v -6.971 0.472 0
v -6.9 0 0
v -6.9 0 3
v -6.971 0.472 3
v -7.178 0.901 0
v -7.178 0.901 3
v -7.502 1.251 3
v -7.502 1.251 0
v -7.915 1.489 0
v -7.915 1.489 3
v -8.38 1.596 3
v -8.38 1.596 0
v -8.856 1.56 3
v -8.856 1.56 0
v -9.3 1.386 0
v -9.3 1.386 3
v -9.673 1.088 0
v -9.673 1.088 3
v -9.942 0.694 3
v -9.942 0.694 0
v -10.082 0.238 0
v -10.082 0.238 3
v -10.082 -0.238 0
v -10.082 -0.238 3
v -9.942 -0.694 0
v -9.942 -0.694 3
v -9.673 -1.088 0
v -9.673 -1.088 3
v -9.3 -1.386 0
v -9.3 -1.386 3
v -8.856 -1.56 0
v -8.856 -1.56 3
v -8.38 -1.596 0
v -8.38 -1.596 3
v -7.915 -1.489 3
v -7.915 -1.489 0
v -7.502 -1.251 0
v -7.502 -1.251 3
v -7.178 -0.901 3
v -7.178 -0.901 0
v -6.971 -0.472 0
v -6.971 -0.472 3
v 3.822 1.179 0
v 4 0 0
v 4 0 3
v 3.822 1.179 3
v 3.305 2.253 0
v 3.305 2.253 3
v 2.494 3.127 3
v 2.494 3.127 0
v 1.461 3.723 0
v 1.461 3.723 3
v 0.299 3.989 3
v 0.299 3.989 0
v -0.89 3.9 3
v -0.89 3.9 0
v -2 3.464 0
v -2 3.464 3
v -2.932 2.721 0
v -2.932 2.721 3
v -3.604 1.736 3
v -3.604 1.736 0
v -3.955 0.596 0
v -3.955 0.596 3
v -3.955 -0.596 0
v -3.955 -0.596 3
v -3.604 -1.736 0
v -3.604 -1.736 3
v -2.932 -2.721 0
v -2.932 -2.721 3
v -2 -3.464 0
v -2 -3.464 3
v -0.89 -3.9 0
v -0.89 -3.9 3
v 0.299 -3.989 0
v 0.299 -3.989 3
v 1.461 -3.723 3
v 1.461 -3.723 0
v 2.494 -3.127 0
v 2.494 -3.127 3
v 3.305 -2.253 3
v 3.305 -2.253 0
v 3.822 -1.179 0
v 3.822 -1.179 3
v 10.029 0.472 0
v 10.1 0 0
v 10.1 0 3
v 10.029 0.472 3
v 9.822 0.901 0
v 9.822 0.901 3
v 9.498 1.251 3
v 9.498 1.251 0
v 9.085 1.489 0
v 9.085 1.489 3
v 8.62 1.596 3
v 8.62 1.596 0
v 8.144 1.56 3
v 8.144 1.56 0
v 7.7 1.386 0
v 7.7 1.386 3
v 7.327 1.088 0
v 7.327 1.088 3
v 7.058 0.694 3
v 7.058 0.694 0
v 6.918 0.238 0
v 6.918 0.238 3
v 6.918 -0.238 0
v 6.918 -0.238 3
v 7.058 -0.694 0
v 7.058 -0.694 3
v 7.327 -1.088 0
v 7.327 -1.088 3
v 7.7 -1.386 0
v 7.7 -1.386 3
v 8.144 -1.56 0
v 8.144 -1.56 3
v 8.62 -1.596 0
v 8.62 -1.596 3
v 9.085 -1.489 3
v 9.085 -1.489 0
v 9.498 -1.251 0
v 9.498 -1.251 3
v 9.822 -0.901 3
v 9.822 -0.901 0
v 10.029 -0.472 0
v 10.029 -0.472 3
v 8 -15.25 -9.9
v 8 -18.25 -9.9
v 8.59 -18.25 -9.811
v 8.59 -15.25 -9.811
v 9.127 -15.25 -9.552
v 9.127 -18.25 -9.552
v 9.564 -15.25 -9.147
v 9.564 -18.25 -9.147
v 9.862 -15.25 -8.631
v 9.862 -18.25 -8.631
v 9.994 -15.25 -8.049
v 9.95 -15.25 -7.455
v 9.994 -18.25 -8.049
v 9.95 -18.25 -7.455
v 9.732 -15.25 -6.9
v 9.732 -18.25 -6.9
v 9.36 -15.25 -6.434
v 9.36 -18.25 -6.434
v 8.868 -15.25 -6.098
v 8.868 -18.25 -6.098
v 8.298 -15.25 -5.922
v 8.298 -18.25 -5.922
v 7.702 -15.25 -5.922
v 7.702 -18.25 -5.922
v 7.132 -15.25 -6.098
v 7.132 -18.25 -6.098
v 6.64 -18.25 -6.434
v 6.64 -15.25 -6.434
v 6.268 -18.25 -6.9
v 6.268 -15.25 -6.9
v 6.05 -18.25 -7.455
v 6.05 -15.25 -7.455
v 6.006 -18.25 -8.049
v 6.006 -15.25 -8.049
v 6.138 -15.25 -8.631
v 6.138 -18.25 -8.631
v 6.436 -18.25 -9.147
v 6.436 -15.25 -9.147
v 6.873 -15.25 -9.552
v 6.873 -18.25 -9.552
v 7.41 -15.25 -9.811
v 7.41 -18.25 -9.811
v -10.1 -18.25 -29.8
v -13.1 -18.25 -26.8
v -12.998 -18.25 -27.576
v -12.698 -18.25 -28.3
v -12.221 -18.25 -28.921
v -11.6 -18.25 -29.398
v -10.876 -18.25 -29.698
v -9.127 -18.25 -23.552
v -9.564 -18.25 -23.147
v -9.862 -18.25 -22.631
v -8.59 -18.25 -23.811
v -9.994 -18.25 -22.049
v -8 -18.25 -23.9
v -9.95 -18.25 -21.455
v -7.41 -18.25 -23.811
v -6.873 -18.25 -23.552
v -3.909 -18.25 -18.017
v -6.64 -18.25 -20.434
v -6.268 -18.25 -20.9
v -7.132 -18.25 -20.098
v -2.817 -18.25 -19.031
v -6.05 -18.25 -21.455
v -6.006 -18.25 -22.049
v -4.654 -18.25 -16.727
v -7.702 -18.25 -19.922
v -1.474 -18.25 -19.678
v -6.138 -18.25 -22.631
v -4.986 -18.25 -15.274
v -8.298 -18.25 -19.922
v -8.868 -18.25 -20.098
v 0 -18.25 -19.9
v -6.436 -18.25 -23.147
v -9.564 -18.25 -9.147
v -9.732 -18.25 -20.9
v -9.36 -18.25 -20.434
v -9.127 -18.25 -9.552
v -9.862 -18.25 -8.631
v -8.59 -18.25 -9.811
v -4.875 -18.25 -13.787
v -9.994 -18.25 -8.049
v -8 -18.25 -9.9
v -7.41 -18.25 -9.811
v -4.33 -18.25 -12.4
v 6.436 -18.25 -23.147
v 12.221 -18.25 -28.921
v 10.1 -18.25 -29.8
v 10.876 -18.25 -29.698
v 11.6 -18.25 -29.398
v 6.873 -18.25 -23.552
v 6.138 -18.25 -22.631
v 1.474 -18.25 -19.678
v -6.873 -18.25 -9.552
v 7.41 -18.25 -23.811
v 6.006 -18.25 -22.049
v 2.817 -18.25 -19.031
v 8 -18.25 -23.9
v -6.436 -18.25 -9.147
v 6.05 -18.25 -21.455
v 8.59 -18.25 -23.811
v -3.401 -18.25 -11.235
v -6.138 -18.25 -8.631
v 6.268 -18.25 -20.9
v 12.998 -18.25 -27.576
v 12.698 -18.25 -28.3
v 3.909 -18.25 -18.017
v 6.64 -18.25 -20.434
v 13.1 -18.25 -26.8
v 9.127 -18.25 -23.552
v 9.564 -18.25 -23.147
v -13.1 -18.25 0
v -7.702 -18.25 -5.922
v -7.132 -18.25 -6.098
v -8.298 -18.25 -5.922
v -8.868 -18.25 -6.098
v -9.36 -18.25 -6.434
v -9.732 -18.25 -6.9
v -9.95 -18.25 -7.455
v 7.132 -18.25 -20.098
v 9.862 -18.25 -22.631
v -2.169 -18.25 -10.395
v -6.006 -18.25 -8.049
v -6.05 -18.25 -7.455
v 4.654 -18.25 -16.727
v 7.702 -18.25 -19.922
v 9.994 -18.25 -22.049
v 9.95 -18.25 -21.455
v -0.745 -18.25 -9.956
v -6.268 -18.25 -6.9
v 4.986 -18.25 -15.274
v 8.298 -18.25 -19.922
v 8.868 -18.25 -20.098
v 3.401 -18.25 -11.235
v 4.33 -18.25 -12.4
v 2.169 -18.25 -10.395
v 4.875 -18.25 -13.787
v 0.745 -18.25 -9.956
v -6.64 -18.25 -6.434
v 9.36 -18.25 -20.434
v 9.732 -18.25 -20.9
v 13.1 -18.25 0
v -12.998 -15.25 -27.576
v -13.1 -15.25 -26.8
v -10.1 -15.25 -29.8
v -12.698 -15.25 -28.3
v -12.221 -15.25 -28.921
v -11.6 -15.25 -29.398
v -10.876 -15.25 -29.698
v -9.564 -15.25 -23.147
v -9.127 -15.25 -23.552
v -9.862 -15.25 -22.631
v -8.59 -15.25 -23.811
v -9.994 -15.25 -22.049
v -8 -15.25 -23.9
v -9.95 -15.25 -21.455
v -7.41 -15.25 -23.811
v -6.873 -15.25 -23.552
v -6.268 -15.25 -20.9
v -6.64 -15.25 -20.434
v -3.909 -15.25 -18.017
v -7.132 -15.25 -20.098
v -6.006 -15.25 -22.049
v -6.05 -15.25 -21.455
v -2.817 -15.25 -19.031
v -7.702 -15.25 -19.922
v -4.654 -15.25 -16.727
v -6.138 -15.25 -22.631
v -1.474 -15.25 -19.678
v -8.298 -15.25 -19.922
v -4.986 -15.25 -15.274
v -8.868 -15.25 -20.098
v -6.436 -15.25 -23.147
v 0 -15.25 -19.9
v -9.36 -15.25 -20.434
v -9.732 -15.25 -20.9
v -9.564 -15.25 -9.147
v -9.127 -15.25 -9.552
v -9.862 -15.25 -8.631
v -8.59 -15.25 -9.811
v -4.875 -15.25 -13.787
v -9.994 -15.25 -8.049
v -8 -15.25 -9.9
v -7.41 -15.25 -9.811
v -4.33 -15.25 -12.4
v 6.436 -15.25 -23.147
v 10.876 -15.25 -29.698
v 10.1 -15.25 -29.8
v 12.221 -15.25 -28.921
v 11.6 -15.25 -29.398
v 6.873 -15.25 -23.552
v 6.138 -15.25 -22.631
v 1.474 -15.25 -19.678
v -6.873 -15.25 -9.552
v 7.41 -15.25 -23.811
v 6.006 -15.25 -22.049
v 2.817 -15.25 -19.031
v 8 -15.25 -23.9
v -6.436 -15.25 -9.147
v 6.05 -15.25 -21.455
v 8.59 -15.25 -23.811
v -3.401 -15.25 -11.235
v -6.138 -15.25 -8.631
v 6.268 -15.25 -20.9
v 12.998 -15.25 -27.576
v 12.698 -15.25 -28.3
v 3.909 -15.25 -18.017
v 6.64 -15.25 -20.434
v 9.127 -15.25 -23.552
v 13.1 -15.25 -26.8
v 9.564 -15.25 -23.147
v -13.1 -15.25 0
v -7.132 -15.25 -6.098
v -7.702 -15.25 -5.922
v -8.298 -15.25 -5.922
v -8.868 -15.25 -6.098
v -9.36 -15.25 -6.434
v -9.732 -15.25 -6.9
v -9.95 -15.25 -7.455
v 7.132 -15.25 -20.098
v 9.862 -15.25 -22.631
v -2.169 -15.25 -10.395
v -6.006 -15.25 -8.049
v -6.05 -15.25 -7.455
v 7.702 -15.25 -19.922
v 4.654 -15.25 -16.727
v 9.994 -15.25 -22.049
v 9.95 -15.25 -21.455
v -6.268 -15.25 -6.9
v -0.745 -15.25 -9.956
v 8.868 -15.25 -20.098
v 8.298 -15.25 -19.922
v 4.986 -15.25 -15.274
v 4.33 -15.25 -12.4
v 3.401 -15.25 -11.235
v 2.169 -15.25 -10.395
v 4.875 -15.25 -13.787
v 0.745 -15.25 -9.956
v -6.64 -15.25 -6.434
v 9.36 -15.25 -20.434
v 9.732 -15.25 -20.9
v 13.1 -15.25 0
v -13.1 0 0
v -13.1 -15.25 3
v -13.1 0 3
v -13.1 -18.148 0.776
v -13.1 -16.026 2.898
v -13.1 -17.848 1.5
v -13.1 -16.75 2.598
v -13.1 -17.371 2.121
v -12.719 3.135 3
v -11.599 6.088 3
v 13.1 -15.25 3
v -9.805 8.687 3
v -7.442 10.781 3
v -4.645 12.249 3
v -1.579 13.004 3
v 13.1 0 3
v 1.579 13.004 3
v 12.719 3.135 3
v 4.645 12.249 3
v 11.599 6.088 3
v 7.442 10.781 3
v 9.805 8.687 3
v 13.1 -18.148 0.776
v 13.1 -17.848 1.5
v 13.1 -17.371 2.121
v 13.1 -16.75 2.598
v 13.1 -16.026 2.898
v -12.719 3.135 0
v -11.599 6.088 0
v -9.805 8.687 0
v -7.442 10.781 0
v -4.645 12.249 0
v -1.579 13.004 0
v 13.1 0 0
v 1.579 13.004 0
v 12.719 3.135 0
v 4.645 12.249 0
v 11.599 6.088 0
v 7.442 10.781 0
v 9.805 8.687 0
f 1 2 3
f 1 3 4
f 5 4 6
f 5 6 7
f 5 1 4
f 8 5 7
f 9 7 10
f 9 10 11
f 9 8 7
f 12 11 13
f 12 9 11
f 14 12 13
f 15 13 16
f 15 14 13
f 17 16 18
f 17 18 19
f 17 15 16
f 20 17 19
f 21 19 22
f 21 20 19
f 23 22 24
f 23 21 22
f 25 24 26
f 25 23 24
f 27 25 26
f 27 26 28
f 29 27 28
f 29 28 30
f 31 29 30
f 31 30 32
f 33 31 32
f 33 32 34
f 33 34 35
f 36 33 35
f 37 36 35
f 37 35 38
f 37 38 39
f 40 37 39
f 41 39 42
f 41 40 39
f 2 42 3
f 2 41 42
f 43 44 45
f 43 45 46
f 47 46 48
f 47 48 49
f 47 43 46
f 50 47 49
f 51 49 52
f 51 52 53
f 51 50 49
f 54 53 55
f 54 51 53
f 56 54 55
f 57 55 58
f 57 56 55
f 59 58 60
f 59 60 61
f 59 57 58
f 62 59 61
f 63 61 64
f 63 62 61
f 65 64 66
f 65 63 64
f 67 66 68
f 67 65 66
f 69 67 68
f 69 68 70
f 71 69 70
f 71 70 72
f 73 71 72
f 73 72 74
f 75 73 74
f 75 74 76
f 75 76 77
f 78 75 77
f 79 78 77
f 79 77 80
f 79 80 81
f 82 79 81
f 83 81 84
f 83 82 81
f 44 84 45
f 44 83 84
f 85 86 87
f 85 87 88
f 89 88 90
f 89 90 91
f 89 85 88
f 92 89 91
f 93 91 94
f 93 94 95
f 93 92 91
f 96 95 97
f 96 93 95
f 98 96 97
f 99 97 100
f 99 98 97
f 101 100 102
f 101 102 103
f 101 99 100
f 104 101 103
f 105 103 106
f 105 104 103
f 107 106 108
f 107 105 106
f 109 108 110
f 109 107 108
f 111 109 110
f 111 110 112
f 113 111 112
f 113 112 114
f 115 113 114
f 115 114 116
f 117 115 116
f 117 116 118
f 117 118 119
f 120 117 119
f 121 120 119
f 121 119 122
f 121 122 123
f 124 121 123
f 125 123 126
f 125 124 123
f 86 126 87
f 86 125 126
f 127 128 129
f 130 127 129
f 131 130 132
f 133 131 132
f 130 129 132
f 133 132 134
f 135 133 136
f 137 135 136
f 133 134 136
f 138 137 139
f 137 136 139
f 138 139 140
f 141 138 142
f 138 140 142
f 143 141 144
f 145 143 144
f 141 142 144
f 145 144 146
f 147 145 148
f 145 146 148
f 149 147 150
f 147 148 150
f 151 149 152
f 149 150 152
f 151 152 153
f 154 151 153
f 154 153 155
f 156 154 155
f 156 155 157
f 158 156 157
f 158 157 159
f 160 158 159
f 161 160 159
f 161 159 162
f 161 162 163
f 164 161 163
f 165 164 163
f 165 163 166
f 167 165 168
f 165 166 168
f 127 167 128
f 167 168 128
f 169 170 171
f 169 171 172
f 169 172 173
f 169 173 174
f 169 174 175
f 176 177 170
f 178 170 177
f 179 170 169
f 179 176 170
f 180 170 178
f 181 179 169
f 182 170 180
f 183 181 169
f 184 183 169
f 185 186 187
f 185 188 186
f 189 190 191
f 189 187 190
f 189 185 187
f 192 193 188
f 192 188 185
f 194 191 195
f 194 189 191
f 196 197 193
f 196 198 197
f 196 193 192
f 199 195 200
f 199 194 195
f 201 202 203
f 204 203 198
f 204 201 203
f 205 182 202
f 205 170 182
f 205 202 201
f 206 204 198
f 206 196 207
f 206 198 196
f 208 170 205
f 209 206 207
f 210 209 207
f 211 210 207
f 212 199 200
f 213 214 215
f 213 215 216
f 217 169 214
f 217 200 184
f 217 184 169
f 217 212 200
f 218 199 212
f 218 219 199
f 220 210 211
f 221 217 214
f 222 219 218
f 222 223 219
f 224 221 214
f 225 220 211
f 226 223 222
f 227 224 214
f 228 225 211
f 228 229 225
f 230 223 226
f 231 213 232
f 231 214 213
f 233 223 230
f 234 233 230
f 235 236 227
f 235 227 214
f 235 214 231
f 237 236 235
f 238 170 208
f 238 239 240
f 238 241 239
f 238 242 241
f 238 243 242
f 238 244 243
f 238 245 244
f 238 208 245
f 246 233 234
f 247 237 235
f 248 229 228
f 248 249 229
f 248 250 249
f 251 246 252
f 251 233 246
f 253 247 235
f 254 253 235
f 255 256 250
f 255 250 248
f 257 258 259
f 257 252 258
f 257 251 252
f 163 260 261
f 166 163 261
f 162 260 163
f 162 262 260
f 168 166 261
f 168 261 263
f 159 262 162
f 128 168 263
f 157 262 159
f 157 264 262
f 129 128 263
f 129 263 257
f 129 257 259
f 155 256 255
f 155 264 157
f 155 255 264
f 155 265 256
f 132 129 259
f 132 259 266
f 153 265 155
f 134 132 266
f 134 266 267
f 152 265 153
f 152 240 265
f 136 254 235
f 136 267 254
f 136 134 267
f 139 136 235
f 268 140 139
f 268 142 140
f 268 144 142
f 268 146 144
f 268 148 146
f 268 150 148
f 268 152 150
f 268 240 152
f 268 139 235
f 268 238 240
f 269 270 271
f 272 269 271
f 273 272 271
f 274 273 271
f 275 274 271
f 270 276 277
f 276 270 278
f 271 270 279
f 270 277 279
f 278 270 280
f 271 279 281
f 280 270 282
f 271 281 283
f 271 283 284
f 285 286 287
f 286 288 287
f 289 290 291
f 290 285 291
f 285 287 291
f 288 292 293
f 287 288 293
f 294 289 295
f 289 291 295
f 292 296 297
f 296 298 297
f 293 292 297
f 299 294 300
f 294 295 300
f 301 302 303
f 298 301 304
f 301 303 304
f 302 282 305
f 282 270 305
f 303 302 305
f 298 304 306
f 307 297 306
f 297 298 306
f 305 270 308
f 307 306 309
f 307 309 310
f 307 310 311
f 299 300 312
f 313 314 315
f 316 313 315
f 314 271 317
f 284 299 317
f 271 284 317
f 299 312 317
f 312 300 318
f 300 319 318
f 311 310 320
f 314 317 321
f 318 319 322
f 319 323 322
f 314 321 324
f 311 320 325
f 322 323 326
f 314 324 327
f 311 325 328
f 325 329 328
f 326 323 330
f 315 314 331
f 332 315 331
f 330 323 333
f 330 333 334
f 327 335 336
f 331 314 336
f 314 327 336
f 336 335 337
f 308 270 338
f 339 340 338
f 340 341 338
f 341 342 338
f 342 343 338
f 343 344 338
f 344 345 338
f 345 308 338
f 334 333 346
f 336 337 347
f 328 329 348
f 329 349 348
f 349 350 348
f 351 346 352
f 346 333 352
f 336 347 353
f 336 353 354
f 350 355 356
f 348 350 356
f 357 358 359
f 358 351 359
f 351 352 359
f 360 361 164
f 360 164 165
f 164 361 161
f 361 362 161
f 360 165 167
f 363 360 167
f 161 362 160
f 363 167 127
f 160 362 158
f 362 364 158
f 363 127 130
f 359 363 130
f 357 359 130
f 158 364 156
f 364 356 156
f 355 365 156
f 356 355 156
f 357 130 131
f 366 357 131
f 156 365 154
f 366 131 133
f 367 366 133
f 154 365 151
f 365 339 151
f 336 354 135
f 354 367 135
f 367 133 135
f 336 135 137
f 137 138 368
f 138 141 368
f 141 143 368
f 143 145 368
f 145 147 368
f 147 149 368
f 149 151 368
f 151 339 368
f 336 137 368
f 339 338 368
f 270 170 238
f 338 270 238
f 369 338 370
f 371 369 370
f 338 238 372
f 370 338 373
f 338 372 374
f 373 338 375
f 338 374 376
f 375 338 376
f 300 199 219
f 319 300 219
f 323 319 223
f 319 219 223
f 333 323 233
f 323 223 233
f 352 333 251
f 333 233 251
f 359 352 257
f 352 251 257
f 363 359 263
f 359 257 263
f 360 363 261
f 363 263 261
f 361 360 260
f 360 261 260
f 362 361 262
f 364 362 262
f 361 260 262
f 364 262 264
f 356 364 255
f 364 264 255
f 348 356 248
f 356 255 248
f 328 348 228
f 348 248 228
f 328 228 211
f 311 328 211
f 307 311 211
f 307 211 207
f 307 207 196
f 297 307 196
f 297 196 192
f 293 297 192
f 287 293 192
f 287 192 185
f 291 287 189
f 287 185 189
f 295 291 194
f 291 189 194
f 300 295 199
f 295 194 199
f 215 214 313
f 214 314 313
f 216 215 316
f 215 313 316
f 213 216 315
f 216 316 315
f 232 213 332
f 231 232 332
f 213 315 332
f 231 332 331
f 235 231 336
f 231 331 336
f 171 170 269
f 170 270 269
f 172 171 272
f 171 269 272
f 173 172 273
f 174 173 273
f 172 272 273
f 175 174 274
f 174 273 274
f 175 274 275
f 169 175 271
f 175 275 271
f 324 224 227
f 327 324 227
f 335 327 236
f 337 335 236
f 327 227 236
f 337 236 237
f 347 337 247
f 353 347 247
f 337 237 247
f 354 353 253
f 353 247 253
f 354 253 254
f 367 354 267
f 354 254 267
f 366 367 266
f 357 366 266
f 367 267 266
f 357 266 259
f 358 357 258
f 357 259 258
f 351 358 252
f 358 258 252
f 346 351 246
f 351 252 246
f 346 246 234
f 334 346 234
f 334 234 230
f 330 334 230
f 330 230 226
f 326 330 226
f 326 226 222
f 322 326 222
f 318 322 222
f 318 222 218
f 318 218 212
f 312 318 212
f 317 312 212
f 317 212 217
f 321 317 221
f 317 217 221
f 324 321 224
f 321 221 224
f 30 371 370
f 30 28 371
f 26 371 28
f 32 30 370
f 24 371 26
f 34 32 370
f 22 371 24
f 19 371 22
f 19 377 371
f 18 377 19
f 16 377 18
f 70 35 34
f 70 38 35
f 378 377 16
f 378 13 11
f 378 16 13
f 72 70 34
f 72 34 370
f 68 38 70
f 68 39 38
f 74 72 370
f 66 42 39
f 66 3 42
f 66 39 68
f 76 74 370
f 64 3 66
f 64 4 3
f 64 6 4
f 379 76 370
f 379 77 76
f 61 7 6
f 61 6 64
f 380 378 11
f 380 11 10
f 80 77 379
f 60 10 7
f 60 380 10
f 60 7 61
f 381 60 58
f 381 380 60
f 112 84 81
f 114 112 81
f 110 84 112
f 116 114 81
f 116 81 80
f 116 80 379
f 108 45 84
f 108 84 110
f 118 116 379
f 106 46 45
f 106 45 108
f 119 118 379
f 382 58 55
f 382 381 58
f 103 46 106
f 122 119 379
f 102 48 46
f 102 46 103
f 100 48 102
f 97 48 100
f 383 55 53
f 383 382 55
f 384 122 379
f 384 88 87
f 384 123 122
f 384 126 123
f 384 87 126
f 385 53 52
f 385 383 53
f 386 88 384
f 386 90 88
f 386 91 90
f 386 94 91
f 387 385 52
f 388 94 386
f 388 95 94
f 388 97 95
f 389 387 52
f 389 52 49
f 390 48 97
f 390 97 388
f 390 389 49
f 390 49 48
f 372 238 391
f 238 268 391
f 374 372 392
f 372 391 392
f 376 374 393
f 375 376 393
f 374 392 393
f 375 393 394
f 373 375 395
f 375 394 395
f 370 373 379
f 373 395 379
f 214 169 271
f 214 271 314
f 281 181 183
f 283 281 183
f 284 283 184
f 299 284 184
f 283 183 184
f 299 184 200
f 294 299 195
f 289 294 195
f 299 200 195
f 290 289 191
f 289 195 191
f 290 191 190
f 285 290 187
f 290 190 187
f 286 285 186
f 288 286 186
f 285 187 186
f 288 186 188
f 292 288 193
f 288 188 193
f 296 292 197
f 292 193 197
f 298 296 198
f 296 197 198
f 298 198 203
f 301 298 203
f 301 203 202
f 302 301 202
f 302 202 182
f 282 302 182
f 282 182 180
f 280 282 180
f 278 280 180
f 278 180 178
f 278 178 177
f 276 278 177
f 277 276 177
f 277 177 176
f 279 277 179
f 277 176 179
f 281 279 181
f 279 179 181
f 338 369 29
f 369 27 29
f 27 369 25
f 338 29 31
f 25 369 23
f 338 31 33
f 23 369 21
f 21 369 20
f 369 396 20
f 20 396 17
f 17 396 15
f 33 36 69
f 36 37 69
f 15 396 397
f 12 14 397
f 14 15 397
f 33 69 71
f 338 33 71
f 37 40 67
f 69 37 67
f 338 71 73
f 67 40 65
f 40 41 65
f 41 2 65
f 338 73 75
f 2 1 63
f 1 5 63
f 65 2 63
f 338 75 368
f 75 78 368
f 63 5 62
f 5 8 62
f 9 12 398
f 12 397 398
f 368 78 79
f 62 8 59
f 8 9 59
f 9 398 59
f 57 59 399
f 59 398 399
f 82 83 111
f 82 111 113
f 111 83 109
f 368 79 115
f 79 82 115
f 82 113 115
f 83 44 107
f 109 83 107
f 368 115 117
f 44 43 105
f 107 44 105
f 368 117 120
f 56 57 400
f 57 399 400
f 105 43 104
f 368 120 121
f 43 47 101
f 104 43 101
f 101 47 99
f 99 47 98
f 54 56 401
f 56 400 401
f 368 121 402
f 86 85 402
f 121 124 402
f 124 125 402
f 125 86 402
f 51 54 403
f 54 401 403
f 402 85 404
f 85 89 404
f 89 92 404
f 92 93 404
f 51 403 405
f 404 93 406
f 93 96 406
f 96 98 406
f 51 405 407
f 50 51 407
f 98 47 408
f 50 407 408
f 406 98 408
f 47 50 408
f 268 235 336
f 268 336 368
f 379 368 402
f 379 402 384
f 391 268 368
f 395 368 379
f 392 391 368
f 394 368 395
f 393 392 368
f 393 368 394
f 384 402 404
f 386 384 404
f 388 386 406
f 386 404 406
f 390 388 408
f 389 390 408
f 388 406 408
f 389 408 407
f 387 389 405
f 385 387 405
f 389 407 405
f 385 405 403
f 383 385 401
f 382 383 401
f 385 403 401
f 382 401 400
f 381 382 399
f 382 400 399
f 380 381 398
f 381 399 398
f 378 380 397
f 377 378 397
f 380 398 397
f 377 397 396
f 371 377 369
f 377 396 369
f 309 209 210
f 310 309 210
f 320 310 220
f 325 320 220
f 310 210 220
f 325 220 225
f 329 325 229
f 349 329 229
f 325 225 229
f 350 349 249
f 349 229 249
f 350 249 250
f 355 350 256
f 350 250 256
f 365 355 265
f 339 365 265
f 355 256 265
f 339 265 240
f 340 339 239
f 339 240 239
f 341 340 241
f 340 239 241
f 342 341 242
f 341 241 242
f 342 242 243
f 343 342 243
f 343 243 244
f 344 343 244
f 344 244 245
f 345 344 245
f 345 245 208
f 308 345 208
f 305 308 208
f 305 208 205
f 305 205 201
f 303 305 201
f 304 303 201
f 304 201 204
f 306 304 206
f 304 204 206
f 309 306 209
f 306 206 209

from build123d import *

# Parameters (mm, degrees)
SKETCH1_R            = 4
SKETCH1_R_2          = 1.6
JGA25_SCREWS_DEPTH   = 3
SKETCH2_W            = 26.2
SKETCH2_H            = 29.8
SKETCH2_R            = 5
SKETCH2_R_2          = 2
BRACKET_SCREWS_DEPTH = 3
L_SHAPE_FILLET_R     = 3
CORNER_FILLETS_R     = 3


with BuildPart() as part:
    # Sketch1 → JGA25-Screws (new body)
    with BuildSketch(Plane.XY):
        with BuildLine():
            Line((-13.1, 0), (-13.1, -18.25))
            Line((-13.1, -18.25), (13.1, -18.25))
            Line((13.1, -18.25), (13.1, 0))
            ThreePointArc((13.1, 0), (0, 13.1), (-13.1, 0))
        make_face()
        Circle(SKETCH1_R, mode=Mode.SUBTRACT)
        with Locations((-8.5, 0)):
            Circle(SKETCH1_R_2, mode=Mode.SUBTRACT)
        with Locations((8.5, 0)):
            Circle(SKETCH1_R_2, mode=Mode.SUBTRACT)
    extrude(amount=JGA25_SCREWS_DEPTH)

    # Sketch2 → Bracket-Screws (add)
    with BuildSketch(Plane.XZ.offset(18.25)):
        with Locations((0, -14.9)):
            Rectangle(SKETCH2_W, SKETCH2_H)
        with Locations(Location((0, -14.9, 0), (0, 0, 270))):
            Circle(SKETCH2_R, mode=Mode.SUBTRACT)
        with Locations(Location((8, -21.9, 0), (0, 0, 270))):
            Circle(SKETCH2_R_2, mode=Mode.SUBTRACT)
        with Locations(Location((-8, -21.9, 0), (0, 0, 270))):
            Circle(SKETCH2_R_2, mode=Mode.SUBTRACT)
        with Locations(Location((8, -7.9, 0), (0, 0, 270))):
            Circle(SKETCH2_R_2, mode=Mode.SUBTRACT)
        with Locations(Location((-8, -7.9, 0), (0, 0, 270))):
            Circle(SKETCH2_R_2, mode=Mode.SUBTRACT)
    extrude(amount=-BRACKET_SCREWS_DEPTH)

    # L-Shape-Fillet
    l_shape_fillet_edges = [part.edges().sort_by_distance(p)[0] for p in [
        (0, -18.25, 3),
    ]]
    fillet(l_shape_fillet_edges, radius=L_SHAPE_FILLET_R)

    # Corner-Fillets
    corner_fillets_edges = [part.edges().sort_by_distance(p)[0] for p in [
        (-13.1, -16.75, -29.8),
        (13.1, -16.75, -29.8),
    ]]
    fillet(corner_fillets_edges, radius=CORNER_FILLETS_R)


solid = part.part
